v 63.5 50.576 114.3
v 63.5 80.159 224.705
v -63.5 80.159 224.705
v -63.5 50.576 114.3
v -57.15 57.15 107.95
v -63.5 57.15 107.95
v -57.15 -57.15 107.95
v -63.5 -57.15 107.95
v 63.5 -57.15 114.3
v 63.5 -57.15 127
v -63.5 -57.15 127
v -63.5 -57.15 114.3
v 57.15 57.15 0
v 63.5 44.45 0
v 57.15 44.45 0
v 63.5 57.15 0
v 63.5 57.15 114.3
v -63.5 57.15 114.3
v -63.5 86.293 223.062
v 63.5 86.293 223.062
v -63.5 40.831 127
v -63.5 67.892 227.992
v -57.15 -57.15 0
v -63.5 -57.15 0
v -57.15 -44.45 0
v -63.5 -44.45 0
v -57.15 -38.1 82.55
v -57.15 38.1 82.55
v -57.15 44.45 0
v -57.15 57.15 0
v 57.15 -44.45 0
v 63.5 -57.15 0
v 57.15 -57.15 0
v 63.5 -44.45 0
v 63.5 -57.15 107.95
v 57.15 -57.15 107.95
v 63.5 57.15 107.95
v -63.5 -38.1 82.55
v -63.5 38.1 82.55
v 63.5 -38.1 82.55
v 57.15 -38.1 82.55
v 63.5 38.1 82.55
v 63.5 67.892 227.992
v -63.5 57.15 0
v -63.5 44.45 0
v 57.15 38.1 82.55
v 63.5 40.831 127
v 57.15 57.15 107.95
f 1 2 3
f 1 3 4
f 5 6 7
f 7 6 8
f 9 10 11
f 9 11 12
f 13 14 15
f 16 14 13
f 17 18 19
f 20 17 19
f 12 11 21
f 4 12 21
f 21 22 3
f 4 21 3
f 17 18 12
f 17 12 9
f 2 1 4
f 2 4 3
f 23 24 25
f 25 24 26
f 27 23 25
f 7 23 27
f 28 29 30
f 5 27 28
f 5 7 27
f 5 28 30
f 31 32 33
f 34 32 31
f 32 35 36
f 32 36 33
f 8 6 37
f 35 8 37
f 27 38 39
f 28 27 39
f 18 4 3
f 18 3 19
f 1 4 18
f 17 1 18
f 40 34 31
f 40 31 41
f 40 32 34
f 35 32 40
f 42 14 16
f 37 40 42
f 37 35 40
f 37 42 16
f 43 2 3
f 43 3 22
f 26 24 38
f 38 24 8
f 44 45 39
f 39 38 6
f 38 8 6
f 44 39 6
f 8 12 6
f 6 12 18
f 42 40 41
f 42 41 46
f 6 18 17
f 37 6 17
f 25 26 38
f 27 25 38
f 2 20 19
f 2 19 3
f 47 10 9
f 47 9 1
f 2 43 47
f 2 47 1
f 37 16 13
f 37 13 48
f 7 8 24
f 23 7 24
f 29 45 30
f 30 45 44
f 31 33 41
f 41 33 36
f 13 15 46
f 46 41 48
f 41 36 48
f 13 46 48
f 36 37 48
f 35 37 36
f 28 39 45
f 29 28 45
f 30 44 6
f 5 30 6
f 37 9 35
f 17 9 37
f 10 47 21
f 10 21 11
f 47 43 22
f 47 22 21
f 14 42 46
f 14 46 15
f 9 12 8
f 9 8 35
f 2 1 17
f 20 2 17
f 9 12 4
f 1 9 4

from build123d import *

# Parameters (mm, degrees)
F1_W     = 127
F1_H     = 114.3
F2_DEPTH = 6.35
F4_DEPTH = 127
F6_DEPTH = 127
F8_DEPTH = 6.35


with BuildPart() as f2:
    # F1 (on offset) → F2 (new body)
    with BuildSketch(Plane.XY.offset(114.3)):
        Rectangle(F1_W, F1_H)
    extrude(amount=-F2_DEPTH)


with BuildPart() as f4:
    # F3 (on face) → F4 (new body, through all)
    with BuildSketch(Plane.YZ.offset(63.5)):
        Polygon((50.575996, 114.3), (57.15, 114.3), (86.292642, 223.061821), (80.159013, 224.705322), align=None)
    extrude(amount=-F4_DEPTH)


with BuildPart() as f6:
    # F5 (on face) → F6 (new body, through all)
    with BuildSketch(Plane.YZ.offset(63.5)):
        Polygon((50.575996, 114.3), (80.159013, 224.705322), (67.891755, 227.992324), (40.830944, 127), (-57.15, 127), (-57.15, 114.3), align=None)
    extrude(amount=-F6_DEPTH)


with BuildPart() as f8:
    # F7 (on face) → F8 (new body)
    with BuildSketch(Plane.YZ.offset(63.5)):
        Polygon((57.15, 107.95), (-57.15, 107.95), (-57.15, 0), (-44.45, 0), (-38.1, 82.55), (38.1, 82.55), (44.45, 0), (57.15, 0), align=None)
    extrude(amount=-F8_DEPTH)


with BuildPart() as f9_1:
    # F9: instance of F8
    add(f8.part.mirror(Plane.YZ))


solid = Compound([f2.part, f4.part, f6.part, f8.part, f9_1.part])
